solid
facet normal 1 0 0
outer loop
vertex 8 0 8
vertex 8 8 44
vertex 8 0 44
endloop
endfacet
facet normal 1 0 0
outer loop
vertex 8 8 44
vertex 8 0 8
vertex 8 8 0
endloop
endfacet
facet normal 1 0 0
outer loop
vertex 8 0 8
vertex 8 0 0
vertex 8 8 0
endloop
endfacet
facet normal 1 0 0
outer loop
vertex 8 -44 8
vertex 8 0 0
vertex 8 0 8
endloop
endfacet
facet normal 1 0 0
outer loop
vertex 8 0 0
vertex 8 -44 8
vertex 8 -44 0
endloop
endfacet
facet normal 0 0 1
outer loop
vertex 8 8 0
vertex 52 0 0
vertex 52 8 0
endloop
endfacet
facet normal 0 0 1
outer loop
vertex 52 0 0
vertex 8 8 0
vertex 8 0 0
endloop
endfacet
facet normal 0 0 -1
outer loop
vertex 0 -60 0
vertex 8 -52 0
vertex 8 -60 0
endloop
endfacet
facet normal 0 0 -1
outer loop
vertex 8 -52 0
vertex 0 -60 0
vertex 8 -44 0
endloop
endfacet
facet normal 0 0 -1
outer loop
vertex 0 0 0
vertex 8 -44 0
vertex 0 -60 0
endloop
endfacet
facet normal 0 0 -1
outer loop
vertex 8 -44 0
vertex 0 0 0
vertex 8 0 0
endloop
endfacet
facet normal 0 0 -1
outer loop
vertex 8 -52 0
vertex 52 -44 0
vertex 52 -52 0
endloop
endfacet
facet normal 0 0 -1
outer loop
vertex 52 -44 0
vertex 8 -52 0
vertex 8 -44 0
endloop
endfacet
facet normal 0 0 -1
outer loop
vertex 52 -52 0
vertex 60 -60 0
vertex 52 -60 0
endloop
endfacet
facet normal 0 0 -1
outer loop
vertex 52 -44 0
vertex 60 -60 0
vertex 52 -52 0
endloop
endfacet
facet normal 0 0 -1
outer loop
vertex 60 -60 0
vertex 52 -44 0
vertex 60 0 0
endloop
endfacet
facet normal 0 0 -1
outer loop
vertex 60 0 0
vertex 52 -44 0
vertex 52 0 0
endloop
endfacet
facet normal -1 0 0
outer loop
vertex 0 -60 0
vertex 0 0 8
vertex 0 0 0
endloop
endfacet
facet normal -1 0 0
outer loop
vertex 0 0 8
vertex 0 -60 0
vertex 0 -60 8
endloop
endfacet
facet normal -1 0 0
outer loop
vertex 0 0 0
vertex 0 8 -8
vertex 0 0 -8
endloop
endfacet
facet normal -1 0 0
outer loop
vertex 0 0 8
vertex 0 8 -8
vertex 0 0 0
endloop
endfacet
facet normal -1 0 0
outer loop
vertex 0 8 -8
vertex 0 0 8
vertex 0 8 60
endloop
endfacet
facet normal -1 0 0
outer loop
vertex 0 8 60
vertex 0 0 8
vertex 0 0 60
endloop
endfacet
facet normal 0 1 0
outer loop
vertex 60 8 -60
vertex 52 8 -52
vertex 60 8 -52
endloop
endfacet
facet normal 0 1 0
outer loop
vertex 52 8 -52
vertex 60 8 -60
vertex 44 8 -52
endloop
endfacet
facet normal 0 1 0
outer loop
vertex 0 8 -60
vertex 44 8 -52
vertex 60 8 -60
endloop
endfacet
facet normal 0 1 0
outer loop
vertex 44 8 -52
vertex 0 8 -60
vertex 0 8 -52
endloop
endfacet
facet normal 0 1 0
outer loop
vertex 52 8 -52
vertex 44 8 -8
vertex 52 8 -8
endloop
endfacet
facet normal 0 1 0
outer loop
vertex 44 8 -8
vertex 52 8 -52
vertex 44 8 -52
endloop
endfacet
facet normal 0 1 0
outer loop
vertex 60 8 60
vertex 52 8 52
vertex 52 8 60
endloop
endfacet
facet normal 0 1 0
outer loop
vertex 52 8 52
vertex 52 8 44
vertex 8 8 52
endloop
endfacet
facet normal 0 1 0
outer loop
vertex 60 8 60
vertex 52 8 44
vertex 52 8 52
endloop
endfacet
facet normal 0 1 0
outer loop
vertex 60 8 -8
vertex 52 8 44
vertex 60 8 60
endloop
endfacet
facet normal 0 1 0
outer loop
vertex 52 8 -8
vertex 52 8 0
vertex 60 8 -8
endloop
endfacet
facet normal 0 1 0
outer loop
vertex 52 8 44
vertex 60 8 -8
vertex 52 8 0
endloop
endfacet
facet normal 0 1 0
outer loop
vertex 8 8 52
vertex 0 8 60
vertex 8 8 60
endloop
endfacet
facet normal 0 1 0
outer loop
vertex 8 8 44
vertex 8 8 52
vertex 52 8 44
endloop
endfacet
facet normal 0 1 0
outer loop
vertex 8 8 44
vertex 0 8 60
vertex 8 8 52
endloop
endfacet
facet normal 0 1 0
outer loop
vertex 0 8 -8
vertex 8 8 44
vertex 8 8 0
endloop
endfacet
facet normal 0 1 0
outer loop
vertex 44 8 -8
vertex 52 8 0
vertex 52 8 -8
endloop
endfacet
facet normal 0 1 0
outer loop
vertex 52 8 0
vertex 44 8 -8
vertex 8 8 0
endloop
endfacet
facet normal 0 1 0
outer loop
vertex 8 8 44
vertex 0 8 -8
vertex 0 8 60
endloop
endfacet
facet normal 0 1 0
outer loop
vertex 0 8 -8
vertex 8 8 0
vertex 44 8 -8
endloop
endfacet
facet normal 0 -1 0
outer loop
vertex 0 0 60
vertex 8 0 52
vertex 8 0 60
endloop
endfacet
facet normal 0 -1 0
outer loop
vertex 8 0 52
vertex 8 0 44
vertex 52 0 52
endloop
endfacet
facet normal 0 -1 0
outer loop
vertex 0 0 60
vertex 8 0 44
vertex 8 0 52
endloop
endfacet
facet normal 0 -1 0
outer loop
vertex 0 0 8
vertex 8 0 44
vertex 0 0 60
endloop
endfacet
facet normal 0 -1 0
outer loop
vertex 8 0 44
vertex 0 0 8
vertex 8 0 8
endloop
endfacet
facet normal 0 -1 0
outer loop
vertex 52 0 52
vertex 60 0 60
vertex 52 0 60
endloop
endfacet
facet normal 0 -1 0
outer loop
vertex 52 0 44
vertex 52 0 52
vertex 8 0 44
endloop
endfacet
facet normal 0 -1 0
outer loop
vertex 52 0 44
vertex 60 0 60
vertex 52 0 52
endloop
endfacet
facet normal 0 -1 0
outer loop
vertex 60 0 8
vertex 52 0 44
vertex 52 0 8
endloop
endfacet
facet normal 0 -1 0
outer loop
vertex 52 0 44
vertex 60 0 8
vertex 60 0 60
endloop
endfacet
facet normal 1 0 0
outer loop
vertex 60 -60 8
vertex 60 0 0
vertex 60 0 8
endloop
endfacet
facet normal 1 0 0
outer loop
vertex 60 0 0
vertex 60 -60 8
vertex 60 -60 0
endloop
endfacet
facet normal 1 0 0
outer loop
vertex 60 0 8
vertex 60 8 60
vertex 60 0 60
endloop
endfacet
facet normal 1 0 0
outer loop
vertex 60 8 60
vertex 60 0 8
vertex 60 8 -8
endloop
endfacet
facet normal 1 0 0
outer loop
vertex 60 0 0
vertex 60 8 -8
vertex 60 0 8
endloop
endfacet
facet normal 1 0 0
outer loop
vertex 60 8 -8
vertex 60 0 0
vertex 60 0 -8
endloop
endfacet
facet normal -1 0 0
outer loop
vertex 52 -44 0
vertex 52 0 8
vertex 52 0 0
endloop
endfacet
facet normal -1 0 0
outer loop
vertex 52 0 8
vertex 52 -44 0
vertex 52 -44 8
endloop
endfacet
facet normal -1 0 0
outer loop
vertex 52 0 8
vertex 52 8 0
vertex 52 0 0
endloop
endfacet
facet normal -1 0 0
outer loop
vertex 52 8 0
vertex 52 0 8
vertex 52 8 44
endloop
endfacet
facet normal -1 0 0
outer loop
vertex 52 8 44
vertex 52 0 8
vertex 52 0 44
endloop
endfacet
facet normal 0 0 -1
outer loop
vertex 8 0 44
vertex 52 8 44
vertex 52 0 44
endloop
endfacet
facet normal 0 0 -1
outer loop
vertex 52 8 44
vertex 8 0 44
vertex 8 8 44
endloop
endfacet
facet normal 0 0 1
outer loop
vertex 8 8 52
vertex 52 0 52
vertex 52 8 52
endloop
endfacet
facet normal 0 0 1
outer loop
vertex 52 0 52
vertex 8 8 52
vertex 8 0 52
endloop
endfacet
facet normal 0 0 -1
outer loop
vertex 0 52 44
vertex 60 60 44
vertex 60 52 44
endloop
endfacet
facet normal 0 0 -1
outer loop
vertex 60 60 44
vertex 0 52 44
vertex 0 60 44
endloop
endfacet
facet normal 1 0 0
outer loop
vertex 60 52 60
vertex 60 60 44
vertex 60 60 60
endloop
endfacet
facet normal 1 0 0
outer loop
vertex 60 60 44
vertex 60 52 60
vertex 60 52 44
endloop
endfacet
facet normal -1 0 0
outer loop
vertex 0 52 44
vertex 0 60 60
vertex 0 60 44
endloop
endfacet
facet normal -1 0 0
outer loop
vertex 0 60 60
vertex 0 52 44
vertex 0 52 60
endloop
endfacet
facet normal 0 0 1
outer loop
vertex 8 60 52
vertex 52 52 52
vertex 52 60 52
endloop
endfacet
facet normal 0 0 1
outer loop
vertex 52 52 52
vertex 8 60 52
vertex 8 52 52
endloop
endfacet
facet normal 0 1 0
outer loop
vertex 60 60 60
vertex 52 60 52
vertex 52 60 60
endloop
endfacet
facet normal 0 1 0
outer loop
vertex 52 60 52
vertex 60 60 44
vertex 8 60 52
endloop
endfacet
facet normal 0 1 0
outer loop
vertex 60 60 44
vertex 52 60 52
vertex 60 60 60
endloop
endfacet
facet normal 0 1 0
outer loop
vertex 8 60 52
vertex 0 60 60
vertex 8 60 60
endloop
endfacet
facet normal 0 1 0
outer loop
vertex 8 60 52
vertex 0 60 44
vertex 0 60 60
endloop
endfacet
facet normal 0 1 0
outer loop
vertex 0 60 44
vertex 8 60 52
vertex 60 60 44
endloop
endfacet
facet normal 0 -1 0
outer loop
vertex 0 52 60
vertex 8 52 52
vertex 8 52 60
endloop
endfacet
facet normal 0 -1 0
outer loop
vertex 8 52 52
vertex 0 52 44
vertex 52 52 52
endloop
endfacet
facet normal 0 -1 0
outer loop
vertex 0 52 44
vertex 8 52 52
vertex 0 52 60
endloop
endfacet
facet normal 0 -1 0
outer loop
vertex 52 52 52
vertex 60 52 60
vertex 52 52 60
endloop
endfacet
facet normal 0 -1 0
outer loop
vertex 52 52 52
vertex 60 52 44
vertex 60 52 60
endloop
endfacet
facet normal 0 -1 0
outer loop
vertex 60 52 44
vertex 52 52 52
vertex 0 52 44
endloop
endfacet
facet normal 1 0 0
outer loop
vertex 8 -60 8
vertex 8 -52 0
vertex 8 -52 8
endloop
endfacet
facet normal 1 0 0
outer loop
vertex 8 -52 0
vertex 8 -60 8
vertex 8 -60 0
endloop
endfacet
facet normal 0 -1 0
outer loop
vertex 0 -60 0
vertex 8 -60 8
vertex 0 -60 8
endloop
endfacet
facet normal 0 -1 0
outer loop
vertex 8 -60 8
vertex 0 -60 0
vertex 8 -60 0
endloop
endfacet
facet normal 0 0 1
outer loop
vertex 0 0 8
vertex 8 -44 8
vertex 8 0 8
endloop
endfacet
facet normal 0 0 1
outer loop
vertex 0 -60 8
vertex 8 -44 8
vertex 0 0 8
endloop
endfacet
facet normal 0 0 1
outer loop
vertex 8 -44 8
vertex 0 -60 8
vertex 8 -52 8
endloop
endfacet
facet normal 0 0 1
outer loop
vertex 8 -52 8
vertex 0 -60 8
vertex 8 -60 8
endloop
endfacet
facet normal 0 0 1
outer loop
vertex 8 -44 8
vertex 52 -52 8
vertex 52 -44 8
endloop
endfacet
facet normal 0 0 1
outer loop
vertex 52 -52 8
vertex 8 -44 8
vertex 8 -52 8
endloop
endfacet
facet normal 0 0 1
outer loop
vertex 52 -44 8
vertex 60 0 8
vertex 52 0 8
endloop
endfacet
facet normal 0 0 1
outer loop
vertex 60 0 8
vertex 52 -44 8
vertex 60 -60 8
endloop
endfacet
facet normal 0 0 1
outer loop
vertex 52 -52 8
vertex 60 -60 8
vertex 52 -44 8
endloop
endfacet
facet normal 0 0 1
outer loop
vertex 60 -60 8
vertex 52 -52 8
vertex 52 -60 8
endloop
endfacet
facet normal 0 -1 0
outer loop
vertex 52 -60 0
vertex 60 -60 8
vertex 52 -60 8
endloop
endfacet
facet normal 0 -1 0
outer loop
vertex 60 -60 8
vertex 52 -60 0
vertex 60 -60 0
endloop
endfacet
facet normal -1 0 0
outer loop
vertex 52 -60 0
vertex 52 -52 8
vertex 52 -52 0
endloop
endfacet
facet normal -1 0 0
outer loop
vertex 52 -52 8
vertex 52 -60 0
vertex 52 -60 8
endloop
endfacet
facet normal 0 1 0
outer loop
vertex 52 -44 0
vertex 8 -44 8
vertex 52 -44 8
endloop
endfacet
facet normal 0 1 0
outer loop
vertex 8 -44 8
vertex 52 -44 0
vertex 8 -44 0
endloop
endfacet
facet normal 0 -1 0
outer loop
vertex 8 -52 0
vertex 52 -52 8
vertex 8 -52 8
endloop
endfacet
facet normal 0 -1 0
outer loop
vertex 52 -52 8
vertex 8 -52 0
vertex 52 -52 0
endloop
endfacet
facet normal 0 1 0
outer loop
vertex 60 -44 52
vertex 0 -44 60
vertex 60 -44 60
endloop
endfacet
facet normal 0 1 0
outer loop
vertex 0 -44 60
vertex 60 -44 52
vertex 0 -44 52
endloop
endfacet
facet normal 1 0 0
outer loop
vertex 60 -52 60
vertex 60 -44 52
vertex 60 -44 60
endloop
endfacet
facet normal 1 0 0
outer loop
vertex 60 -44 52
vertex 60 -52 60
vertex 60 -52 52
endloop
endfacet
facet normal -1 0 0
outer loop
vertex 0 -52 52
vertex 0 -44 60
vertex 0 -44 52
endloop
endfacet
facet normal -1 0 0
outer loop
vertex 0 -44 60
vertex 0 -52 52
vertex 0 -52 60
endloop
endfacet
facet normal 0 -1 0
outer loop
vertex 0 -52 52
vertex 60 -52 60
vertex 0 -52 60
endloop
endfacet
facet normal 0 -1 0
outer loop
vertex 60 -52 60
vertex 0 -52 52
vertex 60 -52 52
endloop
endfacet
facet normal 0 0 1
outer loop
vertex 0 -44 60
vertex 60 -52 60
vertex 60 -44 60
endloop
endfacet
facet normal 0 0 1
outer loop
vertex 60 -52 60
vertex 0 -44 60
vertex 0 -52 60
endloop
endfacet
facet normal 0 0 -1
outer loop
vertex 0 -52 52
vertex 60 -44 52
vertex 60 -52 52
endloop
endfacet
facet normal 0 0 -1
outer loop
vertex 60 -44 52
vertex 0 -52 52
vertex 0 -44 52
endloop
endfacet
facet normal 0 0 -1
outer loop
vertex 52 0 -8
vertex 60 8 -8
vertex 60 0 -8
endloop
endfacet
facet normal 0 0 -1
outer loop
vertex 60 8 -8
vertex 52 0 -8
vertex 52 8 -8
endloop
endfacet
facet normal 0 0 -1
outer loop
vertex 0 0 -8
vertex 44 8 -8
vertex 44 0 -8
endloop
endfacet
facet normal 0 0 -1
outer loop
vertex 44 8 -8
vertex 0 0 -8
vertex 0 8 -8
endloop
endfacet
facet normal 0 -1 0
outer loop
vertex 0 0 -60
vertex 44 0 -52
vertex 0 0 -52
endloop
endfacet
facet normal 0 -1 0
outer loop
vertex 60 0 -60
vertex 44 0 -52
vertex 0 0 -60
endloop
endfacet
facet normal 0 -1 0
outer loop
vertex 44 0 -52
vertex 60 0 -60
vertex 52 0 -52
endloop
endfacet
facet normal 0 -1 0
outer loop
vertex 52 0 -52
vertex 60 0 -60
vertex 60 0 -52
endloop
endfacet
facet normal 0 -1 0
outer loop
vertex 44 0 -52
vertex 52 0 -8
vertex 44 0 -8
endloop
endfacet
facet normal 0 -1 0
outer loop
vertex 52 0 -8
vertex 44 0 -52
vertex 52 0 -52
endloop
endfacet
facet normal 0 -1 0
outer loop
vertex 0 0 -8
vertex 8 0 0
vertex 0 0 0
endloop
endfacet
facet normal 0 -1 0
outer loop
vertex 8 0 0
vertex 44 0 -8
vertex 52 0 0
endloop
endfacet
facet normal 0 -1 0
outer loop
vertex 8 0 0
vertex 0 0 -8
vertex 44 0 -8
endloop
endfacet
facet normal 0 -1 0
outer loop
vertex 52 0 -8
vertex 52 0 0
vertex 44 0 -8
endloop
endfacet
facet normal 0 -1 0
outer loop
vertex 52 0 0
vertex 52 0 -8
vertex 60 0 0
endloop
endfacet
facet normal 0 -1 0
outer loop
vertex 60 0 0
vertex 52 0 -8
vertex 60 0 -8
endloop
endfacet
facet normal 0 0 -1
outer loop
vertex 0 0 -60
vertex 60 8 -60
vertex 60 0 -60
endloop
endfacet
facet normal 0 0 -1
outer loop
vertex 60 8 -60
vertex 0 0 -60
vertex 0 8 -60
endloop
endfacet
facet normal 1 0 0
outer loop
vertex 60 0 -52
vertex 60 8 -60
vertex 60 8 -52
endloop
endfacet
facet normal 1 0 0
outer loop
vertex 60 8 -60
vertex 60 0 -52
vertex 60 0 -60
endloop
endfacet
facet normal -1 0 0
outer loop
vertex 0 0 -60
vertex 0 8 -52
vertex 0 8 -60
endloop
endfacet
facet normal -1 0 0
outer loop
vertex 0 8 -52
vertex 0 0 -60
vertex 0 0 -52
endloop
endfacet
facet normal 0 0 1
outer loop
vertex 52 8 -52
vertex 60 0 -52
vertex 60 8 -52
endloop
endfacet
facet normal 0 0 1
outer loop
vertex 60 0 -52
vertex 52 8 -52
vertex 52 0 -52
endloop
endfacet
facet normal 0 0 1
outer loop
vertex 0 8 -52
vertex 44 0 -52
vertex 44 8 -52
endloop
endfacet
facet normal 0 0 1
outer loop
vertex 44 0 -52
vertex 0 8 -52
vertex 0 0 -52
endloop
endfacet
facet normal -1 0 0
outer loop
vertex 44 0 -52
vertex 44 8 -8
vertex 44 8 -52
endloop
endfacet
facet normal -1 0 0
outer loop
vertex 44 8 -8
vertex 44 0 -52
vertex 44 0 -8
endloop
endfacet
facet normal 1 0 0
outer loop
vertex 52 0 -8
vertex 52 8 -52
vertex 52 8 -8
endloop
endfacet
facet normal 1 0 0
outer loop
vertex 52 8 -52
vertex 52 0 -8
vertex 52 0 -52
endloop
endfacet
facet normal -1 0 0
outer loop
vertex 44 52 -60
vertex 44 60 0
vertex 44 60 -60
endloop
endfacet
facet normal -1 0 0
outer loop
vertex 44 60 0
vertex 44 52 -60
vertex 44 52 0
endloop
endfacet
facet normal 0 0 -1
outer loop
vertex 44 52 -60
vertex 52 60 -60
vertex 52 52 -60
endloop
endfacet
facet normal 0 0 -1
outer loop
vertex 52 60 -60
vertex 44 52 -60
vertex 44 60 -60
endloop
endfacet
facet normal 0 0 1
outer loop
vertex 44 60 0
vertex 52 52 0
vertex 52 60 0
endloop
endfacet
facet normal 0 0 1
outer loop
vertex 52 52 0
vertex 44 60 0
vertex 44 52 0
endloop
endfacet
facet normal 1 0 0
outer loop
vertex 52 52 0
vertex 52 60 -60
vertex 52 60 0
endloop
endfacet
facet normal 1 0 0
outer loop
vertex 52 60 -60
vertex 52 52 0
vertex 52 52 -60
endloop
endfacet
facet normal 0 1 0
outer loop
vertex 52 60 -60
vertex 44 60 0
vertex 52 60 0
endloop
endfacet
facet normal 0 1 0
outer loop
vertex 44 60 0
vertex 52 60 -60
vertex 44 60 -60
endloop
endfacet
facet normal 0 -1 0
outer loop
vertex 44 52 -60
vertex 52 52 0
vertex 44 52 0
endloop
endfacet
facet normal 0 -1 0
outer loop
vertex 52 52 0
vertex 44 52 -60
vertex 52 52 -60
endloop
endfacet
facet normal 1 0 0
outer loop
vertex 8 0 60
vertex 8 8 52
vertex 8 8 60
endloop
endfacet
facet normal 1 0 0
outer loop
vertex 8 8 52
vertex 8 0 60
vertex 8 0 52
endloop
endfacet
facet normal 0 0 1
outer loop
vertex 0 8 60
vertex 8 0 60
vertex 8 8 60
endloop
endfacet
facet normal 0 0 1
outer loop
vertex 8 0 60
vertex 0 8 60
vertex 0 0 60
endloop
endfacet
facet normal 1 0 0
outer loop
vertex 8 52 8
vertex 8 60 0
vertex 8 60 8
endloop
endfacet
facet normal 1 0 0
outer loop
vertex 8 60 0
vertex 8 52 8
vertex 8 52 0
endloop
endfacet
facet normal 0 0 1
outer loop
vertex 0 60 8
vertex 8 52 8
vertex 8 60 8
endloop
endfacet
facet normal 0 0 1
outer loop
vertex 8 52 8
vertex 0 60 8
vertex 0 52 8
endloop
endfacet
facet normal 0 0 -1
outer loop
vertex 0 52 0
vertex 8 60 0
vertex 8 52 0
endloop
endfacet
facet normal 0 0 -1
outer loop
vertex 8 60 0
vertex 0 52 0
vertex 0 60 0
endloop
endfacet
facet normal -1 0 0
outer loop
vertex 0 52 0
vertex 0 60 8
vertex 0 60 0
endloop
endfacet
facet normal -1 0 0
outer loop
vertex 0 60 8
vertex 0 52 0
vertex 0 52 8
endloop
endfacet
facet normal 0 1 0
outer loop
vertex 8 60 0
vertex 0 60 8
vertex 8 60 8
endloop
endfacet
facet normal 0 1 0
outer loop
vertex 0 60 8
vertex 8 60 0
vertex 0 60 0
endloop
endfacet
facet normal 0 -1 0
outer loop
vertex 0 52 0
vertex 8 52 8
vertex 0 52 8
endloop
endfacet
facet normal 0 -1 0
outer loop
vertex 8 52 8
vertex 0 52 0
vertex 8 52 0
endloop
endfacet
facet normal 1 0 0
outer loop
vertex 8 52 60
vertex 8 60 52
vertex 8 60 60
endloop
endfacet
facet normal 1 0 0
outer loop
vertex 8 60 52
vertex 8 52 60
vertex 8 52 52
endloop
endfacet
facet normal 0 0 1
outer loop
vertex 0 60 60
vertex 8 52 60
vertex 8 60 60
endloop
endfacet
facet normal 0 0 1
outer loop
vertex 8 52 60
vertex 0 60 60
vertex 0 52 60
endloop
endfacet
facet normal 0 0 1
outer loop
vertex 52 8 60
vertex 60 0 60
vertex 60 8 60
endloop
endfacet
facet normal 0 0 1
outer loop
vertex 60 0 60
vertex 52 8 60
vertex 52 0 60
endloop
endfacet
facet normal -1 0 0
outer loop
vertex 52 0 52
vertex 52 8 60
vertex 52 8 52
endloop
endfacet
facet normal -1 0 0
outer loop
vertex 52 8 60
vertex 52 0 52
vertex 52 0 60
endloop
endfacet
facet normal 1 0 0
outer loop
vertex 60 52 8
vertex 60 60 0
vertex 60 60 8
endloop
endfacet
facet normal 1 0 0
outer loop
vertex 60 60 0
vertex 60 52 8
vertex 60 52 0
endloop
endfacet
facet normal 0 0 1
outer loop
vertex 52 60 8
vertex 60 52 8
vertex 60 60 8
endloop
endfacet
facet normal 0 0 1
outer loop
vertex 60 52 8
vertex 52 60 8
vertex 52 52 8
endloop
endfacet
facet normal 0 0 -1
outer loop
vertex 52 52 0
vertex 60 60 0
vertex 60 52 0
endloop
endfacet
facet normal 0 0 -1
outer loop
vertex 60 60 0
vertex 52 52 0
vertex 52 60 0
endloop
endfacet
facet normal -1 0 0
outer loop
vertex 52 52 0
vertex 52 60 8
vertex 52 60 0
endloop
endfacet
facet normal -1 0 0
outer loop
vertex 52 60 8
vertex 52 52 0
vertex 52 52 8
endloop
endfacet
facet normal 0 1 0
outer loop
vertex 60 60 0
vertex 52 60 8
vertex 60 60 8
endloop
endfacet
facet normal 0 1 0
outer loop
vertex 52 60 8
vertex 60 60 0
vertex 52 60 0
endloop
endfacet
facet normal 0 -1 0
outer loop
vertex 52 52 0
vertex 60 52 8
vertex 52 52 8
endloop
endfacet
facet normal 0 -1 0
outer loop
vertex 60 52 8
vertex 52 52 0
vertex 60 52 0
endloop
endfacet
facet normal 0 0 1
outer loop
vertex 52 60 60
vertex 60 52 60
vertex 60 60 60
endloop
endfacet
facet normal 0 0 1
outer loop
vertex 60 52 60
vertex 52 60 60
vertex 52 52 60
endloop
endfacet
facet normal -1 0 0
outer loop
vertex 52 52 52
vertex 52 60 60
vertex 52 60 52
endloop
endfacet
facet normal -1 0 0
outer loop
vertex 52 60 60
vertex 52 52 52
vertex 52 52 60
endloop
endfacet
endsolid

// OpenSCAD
// Impossible Cube - Optical Illusion Sculpture
// Escher-style interlocking frame that looks impossible
// Print: 0.2mm, 4 walls, 20% infill, supports for overhangs
// Stunning as desk decor or gift

SIZE   = 60;
BAR_W  = 8;
NOTCH  = BAR_W / 2 + 0.25;  // Interlock clearance

module bar(length) {
    cube([BAR_W, BAR_W, length]);
}

module frame_ring(axis) {
    rotate(axis)
    union() {
        // 4 bars forming a square ring
        translate([0,      0,      0     ]) bar(SIZE);
        translate([SIZE - BAR_W, 0, 0     ]) bar(SIZE);
        translate([0,      0,      SIZE - BAR_W]) rotate([0,90,0]) bar(SIZE);
        translate([0,      SIZE - BAR_W, SIZE - BAR_W]) rotate([0,90,0]) bar(SIZE);
    }
}

module impossible_cube() {
    // Three interlocking square frames, one per axis
    // Notched so they pass through each other (optical trick at corners)
    difference() {
        union() {
            frame_ring([0,   0, 0]);
            frame_ring([90,  0, 0]);
            frame_ring([0,  90, 0]);
        }
        // Corner notches — each frame yields half the corner to the others
        for (x = [0, SIZE - BAR_W], y = [0, SIZE - BAR_W], z = [0, SIZE - BAR_W])
            translate([x, y, z])
                cube([BAR_W, BAR_W, BAR_W]);  // remove full corner overlap
    }
    // Re-add corner cubes as unified solid (impossible joint illusion)
    for (x = [0, SIZE - BAR_W], y = [0, SIZE - BAR_W], z = [0, SIZE - BAR_W])
        translate([x, y, z])
            cube([BAR_W, BAR_W, BAR_W]);
}

impossible_cube();
